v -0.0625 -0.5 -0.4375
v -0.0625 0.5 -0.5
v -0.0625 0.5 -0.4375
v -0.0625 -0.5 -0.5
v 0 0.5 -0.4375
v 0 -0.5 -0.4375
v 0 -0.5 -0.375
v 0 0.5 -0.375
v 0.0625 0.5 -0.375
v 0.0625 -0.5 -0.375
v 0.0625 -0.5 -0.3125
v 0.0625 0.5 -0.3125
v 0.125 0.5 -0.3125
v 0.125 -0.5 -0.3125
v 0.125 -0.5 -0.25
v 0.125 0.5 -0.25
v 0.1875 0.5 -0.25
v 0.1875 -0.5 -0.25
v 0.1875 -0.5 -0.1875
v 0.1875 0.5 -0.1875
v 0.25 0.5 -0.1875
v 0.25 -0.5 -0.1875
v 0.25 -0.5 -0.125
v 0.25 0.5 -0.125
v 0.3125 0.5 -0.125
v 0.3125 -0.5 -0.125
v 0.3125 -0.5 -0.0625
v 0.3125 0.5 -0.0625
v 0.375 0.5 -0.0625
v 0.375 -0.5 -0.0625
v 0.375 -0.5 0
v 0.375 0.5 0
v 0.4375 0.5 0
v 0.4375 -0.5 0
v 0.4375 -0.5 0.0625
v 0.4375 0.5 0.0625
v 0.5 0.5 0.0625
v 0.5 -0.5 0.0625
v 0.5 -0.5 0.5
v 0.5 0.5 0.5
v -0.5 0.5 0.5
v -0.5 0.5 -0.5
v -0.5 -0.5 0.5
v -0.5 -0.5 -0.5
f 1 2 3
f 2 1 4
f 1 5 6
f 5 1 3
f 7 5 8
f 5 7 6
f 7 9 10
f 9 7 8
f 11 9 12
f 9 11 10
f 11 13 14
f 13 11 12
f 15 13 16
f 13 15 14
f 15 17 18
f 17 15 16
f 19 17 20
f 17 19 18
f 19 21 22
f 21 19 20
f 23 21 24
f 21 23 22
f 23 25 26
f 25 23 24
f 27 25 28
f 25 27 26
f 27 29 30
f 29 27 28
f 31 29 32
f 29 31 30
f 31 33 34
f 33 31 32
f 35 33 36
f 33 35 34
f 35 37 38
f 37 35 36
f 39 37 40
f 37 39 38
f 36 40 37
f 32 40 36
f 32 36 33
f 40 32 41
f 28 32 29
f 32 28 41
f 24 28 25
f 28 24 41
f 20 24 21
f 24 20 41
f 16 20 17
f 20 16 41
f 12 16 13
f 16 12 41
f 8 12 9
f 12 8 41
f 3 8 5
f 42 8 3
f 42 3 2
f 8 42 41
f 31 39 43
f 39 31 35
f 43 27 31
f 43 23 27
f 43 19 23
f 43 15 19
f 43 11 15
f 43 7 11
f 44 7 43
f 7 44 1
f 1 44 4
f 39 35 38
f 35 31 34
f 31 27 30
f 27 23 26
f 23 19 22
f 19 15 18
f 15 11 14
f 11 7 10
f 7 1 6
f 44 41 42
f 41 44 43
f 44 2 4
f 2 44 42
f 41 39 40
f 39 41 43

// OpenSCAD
rotate(-90, [1, 0, 0]) {
    difference() {
        cube([1, 1, 1], center = true);
        for(i = [-4 : 4]) {
            translate([(3+i)/16, (3-i)/16, -9/16])
                cube([7/16, 7/16, 18/16]);
        }
    }
}
